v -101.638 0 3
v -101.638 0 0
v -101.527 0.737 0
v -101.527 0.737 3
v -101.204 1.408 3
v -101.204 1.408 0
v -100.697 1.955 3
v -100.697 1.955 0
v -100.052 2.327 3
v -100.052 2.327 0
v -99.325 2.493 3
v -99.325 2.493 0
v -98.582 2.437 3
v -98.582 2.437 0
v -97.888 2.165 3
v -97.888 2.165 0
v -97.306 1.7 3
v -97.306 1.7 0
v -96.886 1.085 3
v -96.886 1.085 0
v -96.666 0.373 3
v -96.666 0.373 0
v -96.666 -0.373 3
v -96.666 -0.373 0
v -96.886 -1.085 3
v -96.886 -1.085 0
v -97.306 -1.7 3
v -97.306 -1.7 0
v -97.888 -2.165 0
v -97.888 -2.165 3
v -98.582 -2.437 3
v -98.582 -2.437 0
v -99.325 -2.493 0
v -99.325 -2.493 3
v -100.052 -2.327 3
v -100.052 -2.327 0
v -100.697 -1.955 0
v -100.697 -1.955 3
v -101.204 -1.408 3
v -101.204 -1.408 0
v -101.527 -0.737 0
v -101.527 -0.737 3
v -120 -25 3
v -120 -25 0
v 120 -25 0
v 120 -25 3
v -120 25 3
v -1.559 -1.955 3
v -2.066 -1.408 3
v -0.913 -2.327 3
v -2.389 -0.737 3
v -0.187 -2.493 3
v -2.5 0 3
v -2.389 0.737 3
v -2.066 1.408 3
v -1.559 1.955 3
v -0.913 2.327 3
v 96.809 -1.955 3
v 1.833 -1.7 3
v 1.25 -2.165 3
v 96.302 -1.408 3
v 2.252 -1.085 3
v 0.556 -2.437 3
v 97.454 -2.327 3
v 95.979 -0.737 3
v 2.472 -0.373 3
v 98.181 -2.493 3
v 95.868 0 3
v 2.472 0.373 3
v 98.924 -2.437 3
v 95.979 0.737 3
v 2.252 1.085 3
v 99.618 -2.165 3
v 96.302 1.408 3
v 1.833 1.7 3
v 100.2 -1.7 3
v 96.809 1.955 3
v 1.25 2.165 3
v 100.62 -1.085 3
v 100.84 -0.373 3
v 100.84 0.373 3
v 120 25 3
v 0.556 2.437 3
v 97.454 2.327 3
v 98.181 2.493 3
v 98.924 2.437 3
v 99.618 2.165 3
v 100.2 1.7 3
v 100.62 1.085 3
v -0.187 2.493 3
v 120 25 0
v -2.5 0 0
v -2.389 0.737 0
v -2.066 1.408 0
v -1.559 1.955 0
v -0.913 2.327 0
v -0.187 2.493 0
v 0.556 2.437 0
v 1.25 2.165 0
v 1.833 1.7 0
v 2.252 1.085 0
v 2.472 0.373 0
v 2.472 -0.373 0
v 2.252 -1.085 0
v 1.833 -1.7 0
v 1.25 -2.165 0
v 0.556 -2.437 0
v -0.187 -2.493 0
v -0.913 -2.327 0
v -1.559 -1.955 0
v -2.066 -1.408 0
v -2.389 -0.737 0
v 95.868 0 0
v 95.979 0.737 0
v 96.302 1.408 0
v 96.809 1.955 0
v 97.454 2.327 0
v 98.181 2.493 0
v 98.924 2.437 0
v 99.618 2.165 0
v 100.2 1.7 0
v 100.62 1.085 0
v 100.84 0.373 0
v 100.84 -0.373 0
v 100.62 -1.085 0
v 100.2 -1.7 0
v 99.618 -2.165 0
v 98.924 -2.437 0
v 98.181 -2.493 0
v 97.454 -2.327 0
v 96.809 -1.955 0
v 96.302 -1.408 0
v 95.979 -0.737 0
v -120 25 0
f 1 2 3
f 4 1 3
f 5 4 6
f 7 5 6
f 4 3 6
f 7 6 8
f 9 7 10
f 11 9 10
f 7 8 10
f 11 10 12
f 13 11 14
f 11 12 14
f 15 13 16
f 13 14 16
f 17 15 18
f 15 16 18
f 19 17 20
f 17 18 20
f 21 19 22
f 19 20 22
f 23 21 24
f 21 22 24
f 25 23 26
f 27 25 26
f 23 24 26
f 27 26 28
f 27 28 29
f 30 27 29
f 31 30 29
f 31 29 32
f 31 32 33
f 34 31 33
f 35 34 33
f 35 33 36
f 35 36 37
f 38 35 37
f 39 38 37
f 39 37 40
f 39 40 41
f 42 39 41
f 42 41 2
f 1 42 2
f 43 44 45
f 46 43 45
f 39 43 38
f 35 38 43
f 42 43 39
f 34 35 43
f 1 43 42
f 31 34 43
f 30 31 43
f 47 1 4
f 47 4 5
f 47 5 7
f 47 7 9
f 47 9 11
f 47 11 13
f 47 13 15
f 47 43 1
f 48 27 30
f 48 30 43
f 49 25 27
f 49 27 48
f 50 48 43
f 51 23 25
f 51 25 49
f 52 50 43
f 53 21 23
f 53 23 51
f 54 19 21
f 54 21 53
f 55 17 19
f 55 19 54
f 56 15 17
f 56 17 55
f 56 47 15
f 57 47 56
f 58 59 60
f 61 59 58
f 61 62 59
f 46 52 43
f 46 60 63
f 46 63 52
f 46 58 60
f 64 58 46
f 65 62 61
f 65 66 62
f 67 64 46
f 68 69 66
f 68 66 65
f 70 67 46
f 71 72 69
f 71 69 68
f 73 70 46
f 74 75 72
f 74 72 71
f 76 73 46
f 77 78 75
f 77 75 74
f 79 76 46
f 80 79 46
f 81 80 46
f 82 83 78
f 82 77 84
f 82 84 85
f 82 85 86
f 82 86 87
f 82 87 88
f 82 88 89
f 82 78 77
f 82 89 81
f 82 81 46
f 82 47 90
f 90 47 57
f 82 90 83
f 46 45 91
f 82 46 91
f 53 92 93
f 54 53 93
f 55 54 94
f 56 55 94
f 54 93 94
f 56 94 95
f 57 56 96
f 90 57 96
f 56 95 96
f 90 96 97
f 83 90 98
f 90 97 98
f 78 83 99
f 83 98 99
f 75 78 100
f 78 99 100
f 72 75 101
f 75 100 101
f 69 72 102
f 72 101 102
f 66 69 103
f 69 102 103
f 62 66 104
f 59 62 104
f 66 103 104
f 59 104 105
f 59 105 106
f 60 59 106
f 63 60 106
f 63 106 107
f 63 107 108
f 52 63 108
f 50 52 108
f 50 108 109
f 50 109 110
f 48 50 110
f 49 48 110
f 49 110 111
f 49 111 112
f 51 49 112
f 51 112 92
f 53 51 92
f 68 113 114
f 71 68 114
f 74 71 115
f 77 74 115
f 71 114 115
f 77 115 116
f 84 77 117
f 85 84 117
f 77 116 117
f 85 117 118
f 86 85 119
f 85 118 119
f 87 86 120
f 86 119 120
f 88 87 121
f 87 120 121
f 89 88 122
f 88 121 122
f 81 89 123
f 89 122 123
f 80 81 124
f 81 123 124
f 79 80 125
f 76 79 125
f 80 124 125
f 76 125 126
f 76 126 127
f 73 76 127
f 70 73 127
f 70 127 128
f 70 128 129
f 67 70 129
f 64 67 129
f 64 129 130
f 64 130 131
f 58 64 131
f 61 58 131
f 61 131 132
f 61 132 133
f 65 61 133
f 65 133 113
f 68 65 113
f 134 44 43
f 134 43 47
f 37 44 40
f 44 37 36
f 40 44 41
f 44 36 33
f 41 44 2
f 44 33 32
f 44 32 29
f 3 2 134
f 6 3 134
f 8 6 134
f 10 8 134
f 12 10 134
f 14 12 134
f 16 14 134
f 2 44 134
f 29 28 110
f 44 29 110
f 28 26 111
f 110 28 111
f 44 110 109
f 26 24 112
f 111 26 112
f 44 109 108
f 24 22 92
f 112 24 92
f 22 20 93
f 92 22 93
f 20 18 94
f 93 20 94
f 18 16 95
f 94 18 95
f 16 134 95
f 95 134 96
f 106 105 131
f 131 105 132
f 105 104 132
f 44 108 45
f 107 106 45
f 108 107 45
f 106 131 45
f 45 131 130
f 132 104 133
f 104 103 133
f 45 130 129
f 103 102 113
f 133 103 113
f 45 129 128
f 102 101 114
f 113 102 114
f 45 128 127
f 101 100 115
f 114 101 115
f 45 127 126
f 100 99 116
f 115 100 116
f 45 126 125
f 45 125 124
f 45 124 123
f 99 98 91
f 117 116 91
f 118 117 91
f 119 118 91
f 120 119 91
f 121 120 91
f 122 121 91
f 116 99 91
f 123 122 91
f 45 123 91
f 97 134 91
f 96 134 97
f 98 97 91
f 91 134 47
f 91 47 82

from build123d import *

# Parameters (mm, degrees)
F0_W     = 240
F0_H     = 50
F1_DEPTH = 3
F4_D     = 5
F5_D     = 5
F7_D     = 5


with BuildPart() as f1:
    # F0 (on Top) → F1 (new body)
    with BuildSketch(Plane.XY):
        Rectangle(F0_W, F0_H)
    extrude(amount=F1_DEPTH)

    # F4 (through all)
    with Locations(Plane.XY.offset(3)):
        with Locations((-99.138439, 0)):
            Hole(F4_D / 2)

    # F5 (through all)
    with Locations(Plane.XY.offset(3)):
        with Locations((0, 0)):
            Hole(F5_D / 2)

    # F7 (through all)
    with Locations(Plane.XY.offset(3)):
        with Locations((98.367669, 0)):
            Hole(F7_D / 2)


solid = f1.part
